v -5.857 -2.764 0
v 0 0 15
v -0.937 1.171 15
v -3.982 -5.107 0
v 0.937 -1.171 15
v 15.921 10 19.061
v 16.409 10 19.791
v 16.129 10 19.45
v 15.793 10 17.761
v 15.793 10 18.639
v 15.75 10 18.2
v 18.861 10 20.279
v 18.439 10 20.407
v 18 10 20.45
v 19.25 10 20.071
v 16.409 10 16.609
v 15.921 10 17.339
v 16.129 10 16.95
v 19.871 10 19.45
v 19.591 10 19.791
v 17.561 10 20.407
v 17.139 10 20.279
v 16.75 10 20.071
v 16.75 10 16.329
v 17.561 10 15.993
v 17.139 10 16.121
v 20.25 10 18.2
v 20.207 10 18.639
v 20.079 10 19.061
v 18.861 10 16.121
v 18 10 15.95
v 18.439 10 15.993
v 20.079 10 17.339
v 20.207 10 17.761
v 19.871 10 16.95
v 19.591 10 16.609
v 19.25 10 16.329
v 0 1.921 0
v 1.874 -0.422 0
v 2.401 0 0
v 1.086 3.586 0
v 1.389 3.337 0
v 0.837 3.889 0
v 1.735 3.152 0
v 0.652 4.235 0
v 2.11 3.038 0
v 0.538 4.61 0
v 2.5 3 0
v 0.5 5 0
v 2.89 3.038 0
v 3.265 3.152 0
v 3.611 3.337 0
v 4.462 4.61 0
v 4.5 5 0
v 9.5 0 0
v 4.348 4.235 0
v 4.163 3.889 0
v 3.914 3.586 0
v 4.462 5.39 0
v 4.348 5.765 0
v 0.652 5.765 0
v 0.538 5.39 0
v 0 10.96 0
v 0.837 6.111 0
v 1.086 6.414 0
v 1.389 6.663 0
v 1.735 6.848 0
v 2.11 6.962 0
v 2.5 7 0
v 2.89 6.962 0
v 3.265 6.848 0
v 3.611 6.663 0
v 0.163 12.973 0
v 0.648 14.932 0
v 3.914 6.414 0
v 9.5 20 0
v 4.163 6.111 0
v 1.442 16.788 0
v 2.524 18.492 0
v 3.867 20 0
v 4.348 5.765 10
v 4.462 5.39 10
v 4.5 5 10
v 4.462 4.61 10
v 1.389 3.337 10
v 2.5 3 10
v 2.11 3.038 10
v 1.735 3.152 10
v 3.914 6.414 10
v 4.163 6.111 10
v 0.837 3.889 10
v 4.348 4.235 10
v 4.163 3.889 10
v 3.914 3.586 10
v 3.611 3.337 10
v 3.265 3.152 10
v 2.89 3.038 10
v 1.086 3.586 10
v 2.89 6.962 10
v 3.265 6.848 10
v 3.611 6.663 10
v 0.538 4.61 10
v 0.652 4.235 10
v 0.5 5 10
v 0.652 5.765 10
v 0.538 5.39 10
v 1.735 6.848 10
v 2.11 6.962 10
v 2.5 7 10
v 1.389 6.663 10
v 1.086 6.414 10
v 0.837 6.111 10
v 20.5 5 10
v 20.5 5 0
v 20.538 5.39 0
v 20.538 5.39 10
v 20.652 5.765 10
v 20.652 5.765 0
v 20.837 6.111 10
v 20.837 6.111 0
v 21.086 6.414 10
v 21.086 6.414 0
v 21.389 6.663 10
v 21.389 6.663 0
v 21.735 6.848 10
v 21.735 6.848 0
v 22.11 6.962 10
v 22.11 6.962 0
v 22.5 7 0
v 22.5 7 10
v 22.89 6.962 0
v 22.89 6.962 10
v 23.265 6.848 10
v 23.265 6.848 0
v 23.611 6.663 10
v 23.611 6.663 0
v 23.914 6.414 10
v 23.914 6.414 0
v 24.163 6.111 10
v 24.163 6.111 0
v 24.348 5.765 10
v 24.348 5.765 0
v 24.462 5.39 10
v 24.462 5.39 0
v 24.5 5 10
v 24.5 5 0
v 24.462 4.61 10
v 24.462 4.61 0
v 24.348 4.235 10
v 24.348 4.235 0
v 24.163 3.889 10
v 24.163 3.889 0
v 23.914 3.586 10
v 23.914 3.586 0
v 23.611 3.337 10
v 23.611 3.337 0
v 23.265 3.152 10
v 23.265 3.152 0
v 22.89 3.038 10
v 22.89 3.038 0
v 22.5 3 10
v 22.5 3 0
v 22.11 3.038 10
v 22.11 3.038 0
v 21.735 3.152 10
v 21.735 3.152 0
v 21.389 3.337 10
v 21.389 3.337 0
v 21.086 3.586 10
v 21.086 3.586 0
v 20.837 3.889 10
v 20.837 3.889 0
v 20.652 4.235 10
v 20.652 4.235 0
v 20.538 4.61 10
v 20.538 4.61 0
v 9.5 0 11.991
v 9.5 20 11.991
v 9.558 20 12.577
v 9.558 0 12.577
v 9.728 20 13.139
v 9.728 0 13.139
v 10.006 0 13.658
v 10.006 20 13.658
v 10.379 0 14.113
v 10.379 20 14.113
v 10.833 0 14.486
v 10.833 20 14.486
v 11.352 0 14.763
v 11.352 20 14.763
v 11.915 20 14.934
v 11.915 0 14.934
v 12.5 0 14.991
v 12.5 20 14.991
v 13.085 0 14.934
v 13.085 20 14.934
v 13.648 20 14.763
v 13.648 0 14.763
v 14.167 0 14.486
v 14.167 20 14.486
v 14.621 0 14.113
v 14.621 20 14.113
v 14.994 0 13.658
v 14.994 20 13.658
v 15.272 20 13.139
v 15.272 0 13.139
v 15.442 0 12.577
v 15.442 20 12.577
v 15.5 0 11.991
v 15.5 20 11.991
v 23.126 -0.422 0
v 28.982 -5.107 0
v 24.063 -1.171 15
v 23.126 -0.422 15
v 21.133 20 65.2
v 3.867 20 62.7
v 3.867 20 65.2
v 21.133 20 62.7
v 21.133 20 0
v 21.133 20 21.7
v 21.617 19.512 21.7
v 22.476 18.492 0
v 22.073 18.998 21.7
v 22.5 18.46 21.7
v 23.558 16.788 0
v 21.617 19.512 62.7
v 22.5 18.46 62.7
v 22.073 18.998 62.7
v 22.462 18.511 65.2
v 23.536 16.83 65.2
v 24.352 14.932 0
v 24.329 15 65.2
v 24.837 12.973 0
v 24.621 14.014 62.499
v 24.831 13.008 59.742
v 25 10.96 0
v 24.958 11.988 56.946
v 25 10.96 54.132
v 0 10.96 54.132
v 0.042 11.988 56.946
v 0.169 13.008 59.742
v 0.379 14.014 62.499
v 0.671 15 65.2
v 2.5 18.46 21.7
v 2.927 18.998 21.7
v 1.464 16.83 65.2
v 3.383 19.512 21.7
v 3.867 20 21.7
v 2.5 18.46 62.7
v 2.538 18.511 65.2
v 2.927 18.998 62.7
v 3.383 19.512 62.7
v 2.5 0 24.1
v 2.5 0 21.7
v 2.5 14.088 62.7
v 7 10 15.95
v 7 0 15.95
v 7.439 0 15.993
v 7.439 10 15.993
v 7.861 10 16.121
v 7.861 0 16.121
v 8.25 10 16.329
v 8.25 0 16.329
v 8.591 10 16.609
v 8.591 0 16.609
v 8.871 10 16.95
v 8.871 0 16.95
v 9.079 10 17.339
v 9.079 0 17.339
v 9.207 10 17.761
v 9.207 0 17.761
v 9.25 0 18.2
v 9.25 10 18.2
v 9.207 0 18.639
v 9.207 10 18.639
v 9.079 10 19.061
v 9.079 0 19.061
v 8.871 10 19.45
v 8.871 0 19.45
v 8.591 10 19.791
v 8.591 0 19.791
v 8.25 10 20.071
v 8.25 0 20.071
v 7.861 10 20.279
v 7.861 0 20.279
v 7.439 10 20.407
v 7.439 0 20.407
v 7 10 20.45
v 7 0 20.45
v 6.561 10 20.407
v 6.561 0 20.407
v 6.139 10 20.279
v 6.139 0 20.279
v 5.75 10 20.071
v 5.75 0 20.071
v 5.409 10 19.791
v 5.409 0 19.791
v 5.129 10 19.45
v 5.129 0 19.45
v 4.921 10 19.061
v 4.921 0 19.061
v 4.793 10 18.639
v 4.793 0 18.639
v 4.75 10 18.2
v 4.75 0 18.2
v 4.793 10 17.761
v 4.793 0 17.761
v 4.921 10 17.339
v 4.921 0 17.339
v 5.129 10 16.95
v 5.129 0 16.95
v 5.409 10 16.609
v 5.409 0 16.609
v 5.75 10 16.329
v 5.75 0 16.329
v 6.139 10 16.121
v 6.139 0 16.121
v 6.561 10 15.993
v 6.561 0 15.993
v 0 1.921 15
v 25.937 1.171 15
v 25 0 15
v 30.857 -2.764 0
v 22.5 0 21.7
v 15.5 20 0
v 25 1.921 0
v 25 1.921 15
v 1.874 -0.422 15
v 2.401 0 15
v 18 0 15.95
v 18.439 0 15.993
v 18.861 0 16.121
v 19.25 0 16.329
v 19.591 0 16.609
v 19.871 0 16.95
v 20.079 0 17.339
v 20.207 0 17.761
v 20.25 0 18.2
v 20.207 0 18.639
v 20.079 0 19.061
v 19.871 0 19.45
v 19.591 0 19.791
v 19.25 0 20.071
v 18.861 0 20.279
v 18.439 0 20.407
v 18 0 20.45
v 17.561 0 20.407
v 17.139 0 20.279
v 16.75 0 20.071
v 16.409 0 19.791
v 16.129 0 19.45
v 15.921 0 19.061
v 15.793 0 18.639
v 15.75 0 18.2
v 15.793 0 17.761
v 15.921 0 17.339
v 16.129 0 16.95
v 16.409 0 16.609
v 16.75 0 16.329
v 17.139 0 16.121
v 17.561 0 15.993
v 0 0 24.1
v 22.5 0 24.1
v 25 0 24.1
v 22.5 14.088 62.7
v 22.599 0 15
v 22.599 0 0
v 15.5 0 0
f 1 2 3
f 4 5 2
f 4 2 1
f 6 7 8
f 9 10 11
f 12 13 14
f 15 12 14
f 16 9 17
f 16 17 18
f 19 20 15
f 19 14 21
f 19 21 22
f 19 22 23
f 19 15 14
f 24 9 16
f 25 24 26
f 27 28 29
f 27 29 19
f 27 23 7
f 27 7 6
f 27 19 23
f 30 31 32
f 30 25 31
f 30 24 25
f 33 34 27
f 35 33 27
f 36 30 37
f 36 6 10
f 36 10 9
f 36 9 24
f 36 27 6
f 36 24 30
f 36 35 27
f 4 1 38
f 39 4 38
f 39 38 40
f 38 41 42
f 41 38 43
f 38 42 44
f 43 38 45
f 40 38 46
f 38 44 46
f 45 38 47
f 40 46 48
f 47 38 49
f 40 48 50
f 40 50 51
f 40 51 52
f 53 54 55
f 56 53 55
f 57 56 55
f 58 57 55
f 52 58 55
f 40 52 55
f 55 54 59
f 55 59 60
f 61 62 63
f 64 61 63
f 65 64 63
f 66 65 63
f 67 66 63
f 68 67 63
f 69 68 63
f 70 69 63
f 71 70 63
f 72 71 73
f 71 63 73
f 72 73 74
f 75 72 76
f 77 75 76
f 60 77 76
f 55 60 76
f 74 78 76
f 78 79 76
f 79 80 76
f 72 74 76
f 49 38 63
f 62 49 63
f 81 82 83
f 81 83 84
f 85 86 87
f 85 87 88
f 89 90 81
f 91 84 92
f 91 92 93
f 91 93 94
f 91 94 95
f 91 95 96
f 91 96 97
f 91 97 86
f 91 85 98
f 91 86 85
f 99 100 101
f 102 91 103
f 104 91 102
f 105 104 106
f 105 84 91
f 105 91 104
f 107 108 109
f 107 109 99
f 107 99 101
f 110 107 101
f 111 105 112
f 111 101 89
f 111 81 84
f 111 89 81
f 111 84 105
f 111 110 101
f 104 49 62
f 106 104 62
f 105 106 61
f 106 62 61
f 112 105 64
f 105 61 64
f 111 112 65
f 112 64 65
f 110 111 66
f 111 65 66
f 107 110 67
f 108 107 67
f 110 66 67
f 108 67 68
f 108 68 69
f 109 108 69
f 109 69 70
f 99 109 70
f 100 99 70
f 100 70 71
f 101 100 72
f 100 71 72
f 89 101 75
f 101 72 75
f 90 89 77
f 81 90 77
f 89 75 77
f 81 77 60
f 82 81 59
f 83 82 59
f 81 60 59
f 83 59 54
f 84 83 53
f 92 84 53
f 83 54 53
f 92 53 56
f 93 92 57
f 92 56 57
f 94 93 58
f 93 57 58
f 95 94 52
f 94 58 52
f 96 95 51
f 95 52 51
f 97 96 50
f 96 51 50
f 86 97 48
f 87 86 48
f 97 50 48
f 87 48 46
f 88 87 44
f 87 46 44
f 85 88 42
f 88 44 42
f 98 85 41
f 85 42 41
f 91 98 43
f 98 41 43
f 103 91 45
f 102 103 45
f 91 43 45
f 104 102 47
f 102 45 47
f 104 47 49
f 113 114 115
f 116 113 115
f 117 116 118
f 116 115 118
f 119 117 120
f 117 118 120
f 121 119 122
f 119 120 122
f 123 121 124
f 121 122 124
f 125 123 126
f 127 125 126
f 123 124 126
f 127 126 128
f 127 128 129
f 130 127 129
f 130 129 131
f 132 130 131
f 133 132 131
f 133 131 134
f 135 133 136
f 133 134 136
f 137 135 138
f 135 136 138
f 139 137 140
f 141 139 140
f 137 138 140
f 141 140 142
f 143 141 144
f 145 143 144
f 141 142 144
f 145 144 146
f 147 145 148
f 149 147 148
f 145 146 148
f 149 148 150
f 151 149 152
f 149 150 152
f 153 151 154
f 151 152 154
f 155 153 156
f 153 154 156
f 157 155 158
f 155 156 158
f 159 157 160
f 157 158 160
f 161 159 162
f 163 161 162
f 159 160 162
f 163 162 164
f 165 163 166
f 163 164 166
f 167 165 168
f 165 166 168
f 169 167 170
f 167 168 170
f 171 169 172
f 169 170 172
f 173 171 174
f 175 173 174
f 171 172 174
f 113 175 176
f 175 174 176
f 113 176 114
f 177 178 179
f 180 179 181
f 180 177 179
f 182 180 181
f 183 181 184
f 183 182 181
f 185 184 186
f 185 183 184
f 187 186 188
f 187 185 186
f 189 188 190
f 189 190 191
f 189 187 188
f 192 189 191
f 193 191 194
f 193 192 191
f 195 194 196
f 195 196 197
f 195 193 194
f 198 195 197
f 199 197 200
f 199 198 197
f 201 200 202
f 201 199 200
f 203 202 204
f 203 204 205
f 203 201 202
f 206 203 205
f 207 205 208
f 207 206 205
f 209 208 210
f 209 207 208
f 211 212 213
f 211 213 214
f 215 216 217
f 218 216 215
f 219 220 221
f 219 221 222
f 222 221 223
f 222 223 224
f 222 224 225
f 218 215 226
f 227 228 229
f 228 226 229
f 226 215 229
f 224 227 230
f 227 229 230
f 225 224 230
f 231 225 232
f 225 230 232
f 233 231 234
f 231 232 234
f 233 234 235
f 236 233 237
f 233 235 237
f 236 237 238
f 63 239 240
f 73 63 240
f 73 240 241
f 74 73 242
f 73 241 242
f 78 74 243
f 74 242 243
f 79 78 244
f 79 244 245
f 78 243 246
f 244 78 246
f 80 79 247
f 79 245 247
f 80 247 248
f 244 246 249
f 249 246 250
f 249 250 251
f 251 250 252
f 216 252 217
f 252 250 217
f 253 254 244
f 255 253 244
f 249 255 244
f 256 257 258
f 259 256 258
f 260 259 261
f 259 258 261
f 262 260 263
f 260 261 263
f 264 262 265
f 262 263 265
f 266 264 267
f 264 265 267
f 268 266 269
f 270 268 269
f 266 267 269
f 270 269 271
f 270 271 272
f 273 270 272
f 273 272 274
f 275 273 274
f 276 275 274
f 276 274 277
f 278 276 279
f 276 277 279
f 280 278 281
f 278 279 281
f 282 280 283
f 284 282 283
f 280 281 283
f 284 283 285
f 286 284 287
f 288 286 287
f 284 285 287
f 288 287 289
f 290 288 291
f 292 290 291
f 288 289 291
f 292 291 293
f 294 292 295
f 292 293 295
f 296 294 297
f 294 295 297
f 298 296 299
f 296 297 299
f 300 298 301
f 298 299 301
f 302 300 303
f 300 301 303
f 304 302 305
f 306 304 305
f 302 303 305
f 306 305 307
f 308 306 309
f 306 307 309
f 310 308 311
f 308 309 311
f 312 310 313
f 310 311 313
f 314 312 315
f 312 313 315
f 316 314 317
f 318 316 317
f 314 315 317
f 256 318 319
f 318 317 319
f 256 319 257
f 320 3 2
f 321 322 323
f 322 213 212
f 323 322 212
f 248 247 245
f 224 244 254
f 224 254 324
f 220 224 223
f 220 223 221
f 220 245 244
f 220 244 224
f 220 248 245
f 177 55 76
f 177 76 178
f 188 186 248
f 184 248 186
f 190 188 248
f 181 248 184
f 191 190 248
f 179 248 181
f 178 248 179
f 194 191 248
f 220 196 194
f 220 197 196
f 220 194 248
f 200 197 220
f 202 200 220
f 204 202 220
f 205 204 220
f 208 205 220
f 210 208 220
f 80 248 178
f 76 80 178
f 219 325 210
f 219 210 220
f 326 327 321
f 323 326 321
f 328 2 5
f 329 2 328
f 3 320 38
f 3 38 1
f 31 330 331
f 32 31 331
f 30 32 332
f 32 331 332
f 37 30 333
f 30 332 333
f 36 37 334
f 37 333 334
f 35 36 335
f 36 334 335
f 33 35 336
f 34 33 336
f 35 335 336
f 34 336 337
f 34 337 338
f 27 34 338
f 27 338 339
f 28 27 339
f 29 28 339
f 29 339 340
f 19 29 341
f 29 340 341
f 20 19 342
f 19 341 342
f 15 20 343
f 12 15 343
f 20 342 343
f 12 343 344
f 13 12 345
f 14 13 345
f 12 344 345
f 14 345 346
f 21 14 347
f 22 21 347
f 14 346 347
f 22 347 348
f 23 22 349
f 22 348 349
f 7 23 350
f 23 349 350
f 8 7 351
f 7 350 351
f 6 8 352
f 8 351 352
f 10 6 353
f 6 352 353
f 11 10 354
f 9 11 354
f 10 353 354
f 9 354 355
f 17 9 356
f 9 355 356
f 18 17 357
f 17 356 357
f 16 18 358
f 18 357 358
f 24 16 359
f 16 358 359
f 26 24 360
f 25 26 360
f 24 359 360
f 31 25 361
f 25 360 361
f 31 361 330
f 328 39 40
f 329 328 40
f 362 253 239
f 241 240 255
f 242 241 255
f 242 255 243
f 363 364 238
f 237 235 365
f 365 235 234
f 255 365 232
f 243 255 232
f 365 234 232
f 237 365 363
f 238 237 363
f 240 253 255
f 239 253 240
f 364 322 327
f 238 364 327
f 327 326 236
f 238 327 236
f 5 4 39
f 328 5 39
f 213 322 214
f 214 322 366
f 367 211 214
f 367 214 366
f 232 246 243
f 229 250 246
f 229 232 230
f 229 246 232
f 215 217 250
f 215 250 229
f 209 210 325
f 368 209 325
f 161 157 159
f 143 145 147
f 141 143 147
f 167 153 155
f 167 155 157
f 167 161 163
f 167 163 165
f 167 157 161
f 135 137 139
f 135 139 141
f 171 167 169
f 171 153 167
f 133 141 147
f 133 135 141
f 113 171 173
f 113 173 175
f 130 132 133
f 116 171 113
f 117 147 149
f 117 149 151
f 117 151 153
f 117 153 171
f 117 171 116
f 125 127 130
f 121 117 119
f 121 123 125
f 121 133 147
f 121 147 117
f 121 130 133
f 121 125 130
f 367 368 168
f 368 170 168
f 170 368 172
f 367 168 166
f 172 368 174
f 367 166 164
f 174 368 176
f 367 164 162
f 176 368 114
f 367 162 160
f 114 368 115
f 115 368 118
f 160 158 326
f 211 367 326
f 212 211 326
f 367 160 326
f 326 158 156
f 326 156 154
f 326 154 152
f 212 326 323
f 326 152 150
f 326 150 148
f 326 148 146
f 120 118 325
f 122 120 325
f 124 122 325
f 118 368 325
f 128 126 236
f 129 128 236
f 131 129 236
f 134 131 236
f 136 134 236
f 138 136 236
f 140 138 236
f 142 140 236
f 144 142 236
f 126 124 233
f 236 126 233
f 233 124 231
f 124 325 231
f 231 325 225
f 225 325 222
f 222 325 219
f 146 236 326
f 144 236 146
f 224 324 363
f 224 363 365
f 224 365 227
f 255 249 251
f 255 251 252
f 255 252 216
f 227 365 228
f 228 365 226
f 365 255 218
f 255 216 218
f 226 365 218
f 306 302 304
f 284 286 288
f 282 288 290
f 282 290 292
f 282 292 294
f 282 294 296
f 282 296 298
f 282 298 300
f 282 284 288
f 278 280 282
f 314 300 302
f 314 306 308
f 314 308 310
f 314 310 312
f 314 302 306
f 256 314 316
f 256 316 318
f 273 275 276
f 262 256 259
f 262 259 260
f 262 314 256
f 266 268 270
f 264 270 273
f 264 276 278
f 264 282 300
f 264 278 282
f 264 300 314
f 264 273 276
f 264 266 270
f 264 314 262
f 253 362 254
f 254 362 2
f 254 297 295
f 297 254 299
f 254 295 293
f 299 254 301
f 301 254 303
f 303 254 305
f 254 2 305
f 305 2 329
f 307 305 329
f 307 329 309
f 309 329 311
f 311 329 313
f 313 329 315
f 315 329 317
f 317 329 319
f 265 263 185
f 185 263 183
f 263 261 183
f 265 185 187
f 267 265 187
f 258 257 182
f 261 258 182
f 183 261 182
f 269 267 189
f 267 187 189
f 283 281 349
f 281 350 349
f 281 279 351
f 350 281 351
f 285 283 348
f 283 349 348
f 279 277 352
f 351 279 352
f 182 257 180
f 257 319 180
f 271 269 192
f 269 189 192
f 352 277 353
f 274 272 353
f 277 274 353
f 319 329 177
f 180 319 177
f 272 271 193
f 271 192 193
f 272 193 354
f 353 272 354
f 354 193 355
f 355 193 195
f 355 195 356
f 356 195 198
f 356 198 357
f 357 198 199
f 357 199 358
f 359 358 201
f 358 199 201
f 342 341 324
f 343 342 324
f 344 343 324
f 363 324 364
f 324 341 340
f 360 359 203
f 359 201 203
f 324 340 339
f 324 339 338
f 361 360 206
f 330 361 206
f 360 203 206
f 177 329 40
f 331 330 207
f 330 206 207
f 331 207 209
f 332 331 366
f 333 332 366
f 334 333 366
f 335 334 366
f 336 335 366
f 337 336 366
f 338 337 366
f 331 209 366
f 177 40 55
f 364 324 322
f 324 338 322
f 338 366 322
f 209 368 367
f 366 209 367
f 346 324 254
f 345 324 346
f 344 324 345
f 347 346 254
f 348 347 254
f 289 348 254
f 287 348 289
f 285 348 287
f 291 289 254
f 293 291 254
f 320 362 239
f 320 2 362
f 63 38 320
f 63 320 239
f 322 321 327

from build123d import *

# Parameters (mm, degrees)
CROQUIS1_W              = 25
CROQUIS1_H              = 20
SALIENTE_EXTRUIR1_DEPTH = 21.7
CROQUIS2_W              = 2.5
CROQUIS2_H              = 20
SALIENTE_EXTRUIR2_DEPTH = 43.5
CROQUIS3_W              = 25
CROQUIS3_H              = 20
SALIENTE_EXTRUIR3_DEPTH = 2.5
CROQUIS4_R              = 2.25
CORTAR_EXTRUIR1_DEPTH   = 10
CROQUIS6_R              = 2
CORTAR_EXTRUIR2_DEPTH   = 10
CORTAR_EXTRUIR4_DEPTH   = 70
SALIENTE_EXTRUIR5_DEPTH = 15
CORTAR_EXTRUIR5_DEPTH   = 15
CORTAR_EXTRUIR6_DEPTH   = 20
CORTAR_EXTRUIR7_START   = -65.2
CORTAR_EXTRUIR7_DEPTH   = 65.2


with BuildPart() as part:
    # Croquis1 → Saliente-Extruir1 (new body)
    with BuildSketch(Plane.XY):
        with Locations((12.5, 10)):
            Rectangle(CROQUIS1_W, CROQUIS1_H)
    extrude(amount=SALIENTE_EXTRUIR1_DEPTH)

    # Croquis2 → Saliente-Extruir2 (add)
    with BuildSketch(Plane.XY.offset(21.7)):
        with Locations((1.25, 10)):
            Rectangle(CROQUIS2_W, CROQUIS2_H)
        with Locations((23.75, 10)):
            Rectangle(CROQUIS2_W, CROQUIS2_H)
    extrude(amount=SALIENTE_EXTRUIR2_DEPTH)

    # Croquis3 → Saliente-Extruir3 (add)
    with BuildSketch(Plane.XY.offset(65.2)):
        with Locations((12.5, 10)):
            Rectangle(CROQUIS3_W, CROQUIS3_H)
    extrude(amount=-SALIENTE_EXTRUIR3_DEPTH)

    # Croquis4 → Cortar-Extruir1 (cut)
    with BuildSketch(Plane.XZ):
        with Locations(Location((7, 18.2, 0), (0, 0, 270))):
            Circle(CROQUIS4_R)
        with Locations(Location((18, 18.2, 0), (0, 0, 270))):
            Circle(CROQUIS4_R)
    extrude(amount=-CORTAR_EXTRUIR1_DEPTH, mode=Mode.SUBTRACT)

    # Croquis6 → Cortar-Extruir2 (cut)
    with BuildSketch(Plane(origin=(0, 0, 0), x_dir=(-1, 0, 0), z_dir=(0, 0, -1))):
        with Locations((-2.5, 5)):
            Circle(CROQUIS6_R)
        with Locations((-22.5, 5)):
            Circle(CROQUIS6_R)
    extrude(amount=-CORTAR_EXTRUIR2_DEPTH, mode=Mode.SUBTRACT)

    # Croquis10 → Cortar-Extruir4 (cut)
    with BuildSketch(Plane(origin=(25, 0, 0), x_dir=(0, 0, -1), z_dir=(1, 0, 0))):
        Polygon((-65.2, 0), (-24.1, 0), (-65.2, 15), align=None)
    extrude(amount=-CORTAR_EXTRUIR4_DEPTH, mode=Mode.SUBTRACT)

    # Croquis11 → Saliente-Extruir5 (add)
    with BuildSketch(Plane(origin=(0, 0, 0), x_dir=(-1, 0, 0), z_dir=(0, 0, -1))):
        Polygon((-25, 1.920937271), (-30.856516071, -2.764275585), (-28.982430928, -5.106882014), (-23.125914857, -0.421669157), (-21.632203551, 0.773299888), align=None)
    saliente_extruir5 = extrude(amount=-SALIENTE_EXTRUIR5_DEPTH)

    # Croquis12 → Cortar-Extruir5 (cut)
    with BuildSketch(Plane(origin=(8.81905499, 11.023818737, 0), x_dir=(0.7808688094430302, -0.6246950475544245, 0), z_dir=(-0.6246950475544245, -0.7808688094430302, 0))):
        Polygon((19.521720236, 15), (25.821720236, 0), (25.821720236, 15), align=None)
    cortar_extruir5 = extrude(amount=-CORTAR_EXTRUIR5_DEPTH, mode=Mode.SUBTRACT)

    # Simetría1: Saliente-Extruir5, Cortar-Extruir5 across plane
    add(saliente_extruir5.mirror(Plane(origin=(12.5, 0, 0), x_dir=(0, 0, 1), z_dir=(1, 0, 0))))
    add(cortar_extruir5.mirror(Plane(origin=(12.5, 0, 0), x_dir=(0, 0, 1), z_dir=(1, 0, 0))), mode=Mode.SUBTRACT)

    # Croquis13 → Cortar-Extruir6 (cut)
    with BuildSketch(Plane.XZ):
        with BuildLine():
            Line((9.5, -11.99123488), (9.5, 11.99123488))
            ThreePointArc((9.5, 11.99123488), (12.5, 14.99123488), (15.5, 11.99123488))
            Line((15.5, 11.99123488), (15.5, -11.99123488))
            ThreePointArc((15.5, -11.99123488), (12.5, -14.99123488), (9.5, -11.99123488))
        make_face()
    extrude(amount=-CORTAR_EXTRUIR6_DEPTH, mode=Mode.SUBTRACT)

    # Croquis14 → Cortar-Extruir7 (cut)
    with BuildSketch(Plane(origin=(0, 0, 0), x_dir=(-1, 0, 0), z_dir=(0, 0, -1)).offset(CORTAR_EXTRUIR7_START)):
        with BuildLine():
            Line((-25, 10.960468636), (-27.59046433, 24.120971106))
            Line((-27.59046433, 24.120971106), (2.993644675, 24.120971106))
            Line((2.993644675, 24.120971106), (0, 10.960468636))
            ThreePointArc((0, 10.960468636), (-12.5, 23.460468636), (-25, 10.960468636))
        make_face()
    extrude(amount=CORTAR_EXTRUIR7_DEPTH, mode=Mode.SUBTRACT)


solid = part.part
